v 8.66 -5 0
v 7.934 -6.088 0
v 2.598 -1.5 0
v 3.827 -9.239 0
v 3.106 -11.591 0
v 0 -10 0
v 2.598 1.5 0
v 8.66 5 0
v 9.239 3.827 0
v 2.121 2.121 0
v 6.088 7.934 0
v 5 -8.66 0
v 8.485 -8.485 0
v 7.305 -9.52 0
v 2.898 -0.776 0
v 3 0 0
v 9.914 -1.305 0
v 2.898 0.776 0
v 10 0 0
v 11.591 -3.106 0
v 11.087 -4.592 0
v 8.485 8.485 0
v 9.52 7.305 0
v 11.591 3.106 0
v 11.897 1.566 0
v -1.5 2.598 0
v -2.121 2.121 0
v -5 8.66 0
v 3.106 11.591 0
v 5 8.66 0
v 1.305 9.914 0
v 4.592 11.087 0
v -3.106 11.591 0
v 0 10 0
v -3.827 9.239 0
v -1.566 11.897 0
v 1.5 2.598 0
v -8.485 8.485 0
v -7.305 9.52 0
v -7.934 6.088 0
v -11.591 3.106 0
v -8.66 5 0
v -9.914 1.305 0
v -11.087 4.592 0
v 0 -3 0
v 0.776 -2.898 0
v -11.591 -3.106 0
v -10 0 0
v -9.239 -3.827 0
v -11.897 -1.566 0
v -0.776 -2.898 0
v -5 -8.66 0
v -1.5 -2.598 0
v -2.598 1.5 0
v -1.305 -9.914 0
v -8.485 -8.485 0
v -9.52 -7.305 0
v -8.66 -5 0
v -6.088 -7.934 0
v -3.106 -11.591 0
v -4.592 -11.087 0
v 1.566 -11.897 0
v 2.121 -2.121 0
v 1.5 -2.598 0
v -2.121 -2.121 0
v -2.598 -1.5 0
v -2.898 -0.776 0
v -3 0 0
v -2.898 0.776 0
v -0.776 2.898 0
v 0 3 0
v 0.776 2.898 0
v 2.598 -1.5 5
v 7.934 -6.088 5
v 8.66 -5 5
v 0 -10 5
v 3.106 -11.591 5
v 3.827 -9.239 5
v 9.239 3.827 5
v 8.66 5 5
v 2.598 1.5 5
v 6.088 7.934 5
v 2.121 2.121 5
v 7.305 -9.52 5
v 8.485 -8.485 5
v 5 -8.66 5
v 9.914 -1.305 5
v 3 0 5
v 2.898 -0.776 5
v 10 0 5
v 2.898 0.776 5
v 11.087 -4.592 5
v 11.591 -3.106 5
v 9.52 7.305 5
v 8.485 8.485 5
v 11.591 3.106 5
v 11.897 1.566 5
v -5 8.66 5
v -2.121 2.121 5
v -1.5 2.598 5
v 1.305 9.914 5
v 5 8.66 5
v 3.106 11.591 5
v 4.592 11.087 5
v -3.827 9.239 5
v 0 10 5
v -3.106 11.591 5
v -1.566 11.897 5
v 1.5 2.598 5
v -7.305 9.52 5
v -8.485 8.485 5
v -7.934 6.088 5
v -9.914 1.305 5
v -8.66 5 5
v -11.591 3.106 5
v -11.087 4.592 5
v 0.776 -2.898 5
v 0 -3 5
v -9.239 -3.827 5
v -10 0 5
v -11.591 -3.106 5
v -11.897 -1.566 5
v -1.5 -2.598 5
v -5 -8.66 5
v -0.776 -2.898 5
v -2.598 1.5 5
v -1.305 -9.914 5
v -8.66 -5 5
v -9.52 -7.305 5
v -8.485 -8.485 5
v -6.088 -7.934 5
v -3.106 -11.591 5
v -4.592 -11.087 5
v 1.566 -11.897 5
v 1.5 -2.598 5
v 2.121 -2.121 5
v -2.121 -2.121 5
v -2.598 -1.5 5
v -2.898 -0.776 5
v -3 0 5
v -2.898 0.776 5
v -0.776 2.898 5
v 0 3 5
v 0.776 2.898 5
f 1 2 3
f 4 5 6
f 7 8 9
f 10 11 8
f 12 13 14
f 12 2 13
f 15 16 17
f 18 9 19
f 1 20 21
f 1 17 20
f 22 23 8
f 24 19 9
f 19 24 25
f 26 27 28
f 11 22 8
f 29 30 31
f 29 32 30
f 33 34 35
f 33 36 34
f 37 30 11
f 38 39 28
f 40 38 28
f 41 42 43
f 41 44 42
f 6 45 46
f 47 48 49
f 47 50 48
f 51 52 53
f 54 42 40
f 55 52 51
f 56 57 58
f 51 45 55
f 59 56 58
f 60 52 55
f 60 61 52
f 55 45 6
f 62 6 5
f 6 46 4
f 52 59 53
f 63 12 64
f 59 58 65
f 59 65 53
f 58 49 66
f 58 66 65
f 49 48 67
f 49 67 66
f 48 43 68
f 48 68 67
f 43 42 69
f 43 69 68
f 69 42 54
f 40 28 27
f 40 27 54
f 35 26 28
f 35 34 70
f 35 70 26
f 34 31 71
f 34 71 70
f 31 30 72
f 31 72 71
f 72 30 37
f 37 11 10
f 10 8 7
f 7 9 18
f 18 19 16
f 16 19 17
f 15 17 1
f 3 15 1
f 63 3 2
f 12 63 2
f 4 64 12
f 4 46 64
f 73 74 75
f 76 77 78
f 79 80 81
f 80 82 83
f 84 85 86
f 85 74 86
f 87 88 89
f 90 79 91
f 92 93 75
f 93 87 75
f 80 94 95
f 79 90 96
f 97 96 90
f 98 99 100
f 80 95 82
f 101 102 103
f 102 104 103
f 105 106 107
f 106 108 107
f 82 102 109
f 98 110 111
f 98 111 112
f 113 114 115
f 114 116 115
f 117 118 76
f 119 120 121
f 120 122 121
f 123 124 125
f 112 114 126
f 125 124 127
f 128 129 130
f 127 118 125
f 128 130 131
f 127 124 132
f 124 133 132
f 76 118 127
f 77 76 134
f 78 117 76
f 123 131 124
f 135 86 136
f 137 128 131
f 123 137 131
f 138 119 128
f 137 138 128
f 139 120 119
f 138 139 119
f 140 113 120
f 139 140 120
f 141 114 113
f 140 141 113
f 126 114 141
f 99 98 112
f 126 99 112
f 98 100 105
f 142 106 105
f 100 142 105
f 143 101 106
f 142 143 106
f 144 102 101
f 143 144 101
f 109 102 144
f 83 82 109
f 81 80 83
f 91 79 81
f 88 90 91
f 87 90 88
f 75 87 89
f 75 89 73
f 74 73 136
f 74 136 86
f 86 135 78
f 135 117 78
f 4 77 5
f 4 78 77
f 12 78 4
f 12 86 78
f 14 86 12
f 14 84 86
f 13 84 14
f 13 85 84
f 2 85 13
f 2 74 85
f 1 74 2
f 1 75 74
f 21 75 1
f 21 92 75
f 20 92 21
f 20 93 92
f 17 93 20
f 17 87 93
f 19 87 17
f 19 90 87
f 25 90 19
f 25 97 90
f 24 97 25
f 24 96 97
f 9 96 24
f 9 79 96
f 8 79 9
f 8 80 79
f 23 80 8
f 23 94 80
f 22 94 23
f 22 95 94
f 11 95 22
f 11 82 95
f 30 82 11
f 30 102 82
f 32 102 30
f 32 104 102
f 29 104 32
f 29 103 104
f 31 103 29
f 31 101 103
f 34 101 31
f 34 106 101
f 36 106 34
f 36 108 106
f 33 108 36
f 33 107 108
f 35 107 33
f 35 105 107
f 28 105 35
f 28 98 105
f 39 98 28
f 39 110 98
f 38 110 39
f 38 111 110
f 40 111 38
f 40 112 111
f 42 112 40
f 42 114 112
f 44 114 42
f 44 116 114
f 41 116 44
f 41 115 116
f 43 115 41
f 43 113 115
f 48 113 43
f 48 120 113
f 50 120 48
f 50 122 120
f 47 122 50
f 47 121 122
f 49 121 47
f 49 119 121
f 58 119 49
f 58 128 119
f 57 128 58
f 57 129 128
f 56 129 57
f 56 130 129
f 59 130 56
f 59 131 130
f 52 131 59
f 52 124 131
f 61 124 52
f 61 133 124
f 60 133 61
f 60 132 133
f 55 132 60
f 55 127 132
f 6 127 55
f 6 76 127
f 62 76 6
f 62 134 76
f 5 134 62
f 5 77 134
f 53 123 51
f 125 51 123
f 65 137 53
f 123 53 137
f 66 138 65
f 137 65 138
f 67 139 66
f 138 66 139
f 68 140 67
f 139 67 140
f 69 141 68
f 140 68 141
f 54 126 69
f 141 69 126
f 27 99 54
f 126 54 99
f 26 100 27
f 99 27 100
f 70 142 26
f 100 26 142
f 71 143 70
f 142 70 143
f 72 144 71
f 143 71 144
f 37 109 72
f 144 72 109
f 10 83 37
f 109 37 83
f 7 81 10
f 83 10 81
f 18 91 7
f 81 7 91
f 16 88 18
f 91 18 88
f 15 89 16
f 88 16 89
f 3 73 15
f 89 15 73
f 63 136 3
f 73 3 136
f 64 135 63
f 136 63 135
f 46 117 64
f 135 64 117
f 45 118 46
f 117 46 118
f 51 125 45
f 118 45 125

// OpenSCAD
// Simple gear from polygon + list comprehension.
teeth = 12;
r_root = 10;
r_tip = 12;
function gear_points(n, r1, r2) = [
  for (i = [0:n - 1]) each [
    [r1 * cos(360 * i / n), r1 * sin(360 * i / n)],
    [r2 * cos(360 * (i + 0.25) / n), r2 * sin(360 * (i + 0.25) / n)],
    [r2 * cos(360 * (i + 0.5) / n), r2 * sin(360 * (i + 0.5) / n)],
    [r1 * cos(360 * (i + 0.75) / n), r1 * sin(360 * (i + 0.75) / n)]
  ]
];
pts = gear_points(teeth, r_root, r_tip);
echo(len(pts));
linear_extrude(height = 5, convexity = 4)
  difference() {
    polygon(pts);
    circle(r = 3, $fn = 24);
  }
